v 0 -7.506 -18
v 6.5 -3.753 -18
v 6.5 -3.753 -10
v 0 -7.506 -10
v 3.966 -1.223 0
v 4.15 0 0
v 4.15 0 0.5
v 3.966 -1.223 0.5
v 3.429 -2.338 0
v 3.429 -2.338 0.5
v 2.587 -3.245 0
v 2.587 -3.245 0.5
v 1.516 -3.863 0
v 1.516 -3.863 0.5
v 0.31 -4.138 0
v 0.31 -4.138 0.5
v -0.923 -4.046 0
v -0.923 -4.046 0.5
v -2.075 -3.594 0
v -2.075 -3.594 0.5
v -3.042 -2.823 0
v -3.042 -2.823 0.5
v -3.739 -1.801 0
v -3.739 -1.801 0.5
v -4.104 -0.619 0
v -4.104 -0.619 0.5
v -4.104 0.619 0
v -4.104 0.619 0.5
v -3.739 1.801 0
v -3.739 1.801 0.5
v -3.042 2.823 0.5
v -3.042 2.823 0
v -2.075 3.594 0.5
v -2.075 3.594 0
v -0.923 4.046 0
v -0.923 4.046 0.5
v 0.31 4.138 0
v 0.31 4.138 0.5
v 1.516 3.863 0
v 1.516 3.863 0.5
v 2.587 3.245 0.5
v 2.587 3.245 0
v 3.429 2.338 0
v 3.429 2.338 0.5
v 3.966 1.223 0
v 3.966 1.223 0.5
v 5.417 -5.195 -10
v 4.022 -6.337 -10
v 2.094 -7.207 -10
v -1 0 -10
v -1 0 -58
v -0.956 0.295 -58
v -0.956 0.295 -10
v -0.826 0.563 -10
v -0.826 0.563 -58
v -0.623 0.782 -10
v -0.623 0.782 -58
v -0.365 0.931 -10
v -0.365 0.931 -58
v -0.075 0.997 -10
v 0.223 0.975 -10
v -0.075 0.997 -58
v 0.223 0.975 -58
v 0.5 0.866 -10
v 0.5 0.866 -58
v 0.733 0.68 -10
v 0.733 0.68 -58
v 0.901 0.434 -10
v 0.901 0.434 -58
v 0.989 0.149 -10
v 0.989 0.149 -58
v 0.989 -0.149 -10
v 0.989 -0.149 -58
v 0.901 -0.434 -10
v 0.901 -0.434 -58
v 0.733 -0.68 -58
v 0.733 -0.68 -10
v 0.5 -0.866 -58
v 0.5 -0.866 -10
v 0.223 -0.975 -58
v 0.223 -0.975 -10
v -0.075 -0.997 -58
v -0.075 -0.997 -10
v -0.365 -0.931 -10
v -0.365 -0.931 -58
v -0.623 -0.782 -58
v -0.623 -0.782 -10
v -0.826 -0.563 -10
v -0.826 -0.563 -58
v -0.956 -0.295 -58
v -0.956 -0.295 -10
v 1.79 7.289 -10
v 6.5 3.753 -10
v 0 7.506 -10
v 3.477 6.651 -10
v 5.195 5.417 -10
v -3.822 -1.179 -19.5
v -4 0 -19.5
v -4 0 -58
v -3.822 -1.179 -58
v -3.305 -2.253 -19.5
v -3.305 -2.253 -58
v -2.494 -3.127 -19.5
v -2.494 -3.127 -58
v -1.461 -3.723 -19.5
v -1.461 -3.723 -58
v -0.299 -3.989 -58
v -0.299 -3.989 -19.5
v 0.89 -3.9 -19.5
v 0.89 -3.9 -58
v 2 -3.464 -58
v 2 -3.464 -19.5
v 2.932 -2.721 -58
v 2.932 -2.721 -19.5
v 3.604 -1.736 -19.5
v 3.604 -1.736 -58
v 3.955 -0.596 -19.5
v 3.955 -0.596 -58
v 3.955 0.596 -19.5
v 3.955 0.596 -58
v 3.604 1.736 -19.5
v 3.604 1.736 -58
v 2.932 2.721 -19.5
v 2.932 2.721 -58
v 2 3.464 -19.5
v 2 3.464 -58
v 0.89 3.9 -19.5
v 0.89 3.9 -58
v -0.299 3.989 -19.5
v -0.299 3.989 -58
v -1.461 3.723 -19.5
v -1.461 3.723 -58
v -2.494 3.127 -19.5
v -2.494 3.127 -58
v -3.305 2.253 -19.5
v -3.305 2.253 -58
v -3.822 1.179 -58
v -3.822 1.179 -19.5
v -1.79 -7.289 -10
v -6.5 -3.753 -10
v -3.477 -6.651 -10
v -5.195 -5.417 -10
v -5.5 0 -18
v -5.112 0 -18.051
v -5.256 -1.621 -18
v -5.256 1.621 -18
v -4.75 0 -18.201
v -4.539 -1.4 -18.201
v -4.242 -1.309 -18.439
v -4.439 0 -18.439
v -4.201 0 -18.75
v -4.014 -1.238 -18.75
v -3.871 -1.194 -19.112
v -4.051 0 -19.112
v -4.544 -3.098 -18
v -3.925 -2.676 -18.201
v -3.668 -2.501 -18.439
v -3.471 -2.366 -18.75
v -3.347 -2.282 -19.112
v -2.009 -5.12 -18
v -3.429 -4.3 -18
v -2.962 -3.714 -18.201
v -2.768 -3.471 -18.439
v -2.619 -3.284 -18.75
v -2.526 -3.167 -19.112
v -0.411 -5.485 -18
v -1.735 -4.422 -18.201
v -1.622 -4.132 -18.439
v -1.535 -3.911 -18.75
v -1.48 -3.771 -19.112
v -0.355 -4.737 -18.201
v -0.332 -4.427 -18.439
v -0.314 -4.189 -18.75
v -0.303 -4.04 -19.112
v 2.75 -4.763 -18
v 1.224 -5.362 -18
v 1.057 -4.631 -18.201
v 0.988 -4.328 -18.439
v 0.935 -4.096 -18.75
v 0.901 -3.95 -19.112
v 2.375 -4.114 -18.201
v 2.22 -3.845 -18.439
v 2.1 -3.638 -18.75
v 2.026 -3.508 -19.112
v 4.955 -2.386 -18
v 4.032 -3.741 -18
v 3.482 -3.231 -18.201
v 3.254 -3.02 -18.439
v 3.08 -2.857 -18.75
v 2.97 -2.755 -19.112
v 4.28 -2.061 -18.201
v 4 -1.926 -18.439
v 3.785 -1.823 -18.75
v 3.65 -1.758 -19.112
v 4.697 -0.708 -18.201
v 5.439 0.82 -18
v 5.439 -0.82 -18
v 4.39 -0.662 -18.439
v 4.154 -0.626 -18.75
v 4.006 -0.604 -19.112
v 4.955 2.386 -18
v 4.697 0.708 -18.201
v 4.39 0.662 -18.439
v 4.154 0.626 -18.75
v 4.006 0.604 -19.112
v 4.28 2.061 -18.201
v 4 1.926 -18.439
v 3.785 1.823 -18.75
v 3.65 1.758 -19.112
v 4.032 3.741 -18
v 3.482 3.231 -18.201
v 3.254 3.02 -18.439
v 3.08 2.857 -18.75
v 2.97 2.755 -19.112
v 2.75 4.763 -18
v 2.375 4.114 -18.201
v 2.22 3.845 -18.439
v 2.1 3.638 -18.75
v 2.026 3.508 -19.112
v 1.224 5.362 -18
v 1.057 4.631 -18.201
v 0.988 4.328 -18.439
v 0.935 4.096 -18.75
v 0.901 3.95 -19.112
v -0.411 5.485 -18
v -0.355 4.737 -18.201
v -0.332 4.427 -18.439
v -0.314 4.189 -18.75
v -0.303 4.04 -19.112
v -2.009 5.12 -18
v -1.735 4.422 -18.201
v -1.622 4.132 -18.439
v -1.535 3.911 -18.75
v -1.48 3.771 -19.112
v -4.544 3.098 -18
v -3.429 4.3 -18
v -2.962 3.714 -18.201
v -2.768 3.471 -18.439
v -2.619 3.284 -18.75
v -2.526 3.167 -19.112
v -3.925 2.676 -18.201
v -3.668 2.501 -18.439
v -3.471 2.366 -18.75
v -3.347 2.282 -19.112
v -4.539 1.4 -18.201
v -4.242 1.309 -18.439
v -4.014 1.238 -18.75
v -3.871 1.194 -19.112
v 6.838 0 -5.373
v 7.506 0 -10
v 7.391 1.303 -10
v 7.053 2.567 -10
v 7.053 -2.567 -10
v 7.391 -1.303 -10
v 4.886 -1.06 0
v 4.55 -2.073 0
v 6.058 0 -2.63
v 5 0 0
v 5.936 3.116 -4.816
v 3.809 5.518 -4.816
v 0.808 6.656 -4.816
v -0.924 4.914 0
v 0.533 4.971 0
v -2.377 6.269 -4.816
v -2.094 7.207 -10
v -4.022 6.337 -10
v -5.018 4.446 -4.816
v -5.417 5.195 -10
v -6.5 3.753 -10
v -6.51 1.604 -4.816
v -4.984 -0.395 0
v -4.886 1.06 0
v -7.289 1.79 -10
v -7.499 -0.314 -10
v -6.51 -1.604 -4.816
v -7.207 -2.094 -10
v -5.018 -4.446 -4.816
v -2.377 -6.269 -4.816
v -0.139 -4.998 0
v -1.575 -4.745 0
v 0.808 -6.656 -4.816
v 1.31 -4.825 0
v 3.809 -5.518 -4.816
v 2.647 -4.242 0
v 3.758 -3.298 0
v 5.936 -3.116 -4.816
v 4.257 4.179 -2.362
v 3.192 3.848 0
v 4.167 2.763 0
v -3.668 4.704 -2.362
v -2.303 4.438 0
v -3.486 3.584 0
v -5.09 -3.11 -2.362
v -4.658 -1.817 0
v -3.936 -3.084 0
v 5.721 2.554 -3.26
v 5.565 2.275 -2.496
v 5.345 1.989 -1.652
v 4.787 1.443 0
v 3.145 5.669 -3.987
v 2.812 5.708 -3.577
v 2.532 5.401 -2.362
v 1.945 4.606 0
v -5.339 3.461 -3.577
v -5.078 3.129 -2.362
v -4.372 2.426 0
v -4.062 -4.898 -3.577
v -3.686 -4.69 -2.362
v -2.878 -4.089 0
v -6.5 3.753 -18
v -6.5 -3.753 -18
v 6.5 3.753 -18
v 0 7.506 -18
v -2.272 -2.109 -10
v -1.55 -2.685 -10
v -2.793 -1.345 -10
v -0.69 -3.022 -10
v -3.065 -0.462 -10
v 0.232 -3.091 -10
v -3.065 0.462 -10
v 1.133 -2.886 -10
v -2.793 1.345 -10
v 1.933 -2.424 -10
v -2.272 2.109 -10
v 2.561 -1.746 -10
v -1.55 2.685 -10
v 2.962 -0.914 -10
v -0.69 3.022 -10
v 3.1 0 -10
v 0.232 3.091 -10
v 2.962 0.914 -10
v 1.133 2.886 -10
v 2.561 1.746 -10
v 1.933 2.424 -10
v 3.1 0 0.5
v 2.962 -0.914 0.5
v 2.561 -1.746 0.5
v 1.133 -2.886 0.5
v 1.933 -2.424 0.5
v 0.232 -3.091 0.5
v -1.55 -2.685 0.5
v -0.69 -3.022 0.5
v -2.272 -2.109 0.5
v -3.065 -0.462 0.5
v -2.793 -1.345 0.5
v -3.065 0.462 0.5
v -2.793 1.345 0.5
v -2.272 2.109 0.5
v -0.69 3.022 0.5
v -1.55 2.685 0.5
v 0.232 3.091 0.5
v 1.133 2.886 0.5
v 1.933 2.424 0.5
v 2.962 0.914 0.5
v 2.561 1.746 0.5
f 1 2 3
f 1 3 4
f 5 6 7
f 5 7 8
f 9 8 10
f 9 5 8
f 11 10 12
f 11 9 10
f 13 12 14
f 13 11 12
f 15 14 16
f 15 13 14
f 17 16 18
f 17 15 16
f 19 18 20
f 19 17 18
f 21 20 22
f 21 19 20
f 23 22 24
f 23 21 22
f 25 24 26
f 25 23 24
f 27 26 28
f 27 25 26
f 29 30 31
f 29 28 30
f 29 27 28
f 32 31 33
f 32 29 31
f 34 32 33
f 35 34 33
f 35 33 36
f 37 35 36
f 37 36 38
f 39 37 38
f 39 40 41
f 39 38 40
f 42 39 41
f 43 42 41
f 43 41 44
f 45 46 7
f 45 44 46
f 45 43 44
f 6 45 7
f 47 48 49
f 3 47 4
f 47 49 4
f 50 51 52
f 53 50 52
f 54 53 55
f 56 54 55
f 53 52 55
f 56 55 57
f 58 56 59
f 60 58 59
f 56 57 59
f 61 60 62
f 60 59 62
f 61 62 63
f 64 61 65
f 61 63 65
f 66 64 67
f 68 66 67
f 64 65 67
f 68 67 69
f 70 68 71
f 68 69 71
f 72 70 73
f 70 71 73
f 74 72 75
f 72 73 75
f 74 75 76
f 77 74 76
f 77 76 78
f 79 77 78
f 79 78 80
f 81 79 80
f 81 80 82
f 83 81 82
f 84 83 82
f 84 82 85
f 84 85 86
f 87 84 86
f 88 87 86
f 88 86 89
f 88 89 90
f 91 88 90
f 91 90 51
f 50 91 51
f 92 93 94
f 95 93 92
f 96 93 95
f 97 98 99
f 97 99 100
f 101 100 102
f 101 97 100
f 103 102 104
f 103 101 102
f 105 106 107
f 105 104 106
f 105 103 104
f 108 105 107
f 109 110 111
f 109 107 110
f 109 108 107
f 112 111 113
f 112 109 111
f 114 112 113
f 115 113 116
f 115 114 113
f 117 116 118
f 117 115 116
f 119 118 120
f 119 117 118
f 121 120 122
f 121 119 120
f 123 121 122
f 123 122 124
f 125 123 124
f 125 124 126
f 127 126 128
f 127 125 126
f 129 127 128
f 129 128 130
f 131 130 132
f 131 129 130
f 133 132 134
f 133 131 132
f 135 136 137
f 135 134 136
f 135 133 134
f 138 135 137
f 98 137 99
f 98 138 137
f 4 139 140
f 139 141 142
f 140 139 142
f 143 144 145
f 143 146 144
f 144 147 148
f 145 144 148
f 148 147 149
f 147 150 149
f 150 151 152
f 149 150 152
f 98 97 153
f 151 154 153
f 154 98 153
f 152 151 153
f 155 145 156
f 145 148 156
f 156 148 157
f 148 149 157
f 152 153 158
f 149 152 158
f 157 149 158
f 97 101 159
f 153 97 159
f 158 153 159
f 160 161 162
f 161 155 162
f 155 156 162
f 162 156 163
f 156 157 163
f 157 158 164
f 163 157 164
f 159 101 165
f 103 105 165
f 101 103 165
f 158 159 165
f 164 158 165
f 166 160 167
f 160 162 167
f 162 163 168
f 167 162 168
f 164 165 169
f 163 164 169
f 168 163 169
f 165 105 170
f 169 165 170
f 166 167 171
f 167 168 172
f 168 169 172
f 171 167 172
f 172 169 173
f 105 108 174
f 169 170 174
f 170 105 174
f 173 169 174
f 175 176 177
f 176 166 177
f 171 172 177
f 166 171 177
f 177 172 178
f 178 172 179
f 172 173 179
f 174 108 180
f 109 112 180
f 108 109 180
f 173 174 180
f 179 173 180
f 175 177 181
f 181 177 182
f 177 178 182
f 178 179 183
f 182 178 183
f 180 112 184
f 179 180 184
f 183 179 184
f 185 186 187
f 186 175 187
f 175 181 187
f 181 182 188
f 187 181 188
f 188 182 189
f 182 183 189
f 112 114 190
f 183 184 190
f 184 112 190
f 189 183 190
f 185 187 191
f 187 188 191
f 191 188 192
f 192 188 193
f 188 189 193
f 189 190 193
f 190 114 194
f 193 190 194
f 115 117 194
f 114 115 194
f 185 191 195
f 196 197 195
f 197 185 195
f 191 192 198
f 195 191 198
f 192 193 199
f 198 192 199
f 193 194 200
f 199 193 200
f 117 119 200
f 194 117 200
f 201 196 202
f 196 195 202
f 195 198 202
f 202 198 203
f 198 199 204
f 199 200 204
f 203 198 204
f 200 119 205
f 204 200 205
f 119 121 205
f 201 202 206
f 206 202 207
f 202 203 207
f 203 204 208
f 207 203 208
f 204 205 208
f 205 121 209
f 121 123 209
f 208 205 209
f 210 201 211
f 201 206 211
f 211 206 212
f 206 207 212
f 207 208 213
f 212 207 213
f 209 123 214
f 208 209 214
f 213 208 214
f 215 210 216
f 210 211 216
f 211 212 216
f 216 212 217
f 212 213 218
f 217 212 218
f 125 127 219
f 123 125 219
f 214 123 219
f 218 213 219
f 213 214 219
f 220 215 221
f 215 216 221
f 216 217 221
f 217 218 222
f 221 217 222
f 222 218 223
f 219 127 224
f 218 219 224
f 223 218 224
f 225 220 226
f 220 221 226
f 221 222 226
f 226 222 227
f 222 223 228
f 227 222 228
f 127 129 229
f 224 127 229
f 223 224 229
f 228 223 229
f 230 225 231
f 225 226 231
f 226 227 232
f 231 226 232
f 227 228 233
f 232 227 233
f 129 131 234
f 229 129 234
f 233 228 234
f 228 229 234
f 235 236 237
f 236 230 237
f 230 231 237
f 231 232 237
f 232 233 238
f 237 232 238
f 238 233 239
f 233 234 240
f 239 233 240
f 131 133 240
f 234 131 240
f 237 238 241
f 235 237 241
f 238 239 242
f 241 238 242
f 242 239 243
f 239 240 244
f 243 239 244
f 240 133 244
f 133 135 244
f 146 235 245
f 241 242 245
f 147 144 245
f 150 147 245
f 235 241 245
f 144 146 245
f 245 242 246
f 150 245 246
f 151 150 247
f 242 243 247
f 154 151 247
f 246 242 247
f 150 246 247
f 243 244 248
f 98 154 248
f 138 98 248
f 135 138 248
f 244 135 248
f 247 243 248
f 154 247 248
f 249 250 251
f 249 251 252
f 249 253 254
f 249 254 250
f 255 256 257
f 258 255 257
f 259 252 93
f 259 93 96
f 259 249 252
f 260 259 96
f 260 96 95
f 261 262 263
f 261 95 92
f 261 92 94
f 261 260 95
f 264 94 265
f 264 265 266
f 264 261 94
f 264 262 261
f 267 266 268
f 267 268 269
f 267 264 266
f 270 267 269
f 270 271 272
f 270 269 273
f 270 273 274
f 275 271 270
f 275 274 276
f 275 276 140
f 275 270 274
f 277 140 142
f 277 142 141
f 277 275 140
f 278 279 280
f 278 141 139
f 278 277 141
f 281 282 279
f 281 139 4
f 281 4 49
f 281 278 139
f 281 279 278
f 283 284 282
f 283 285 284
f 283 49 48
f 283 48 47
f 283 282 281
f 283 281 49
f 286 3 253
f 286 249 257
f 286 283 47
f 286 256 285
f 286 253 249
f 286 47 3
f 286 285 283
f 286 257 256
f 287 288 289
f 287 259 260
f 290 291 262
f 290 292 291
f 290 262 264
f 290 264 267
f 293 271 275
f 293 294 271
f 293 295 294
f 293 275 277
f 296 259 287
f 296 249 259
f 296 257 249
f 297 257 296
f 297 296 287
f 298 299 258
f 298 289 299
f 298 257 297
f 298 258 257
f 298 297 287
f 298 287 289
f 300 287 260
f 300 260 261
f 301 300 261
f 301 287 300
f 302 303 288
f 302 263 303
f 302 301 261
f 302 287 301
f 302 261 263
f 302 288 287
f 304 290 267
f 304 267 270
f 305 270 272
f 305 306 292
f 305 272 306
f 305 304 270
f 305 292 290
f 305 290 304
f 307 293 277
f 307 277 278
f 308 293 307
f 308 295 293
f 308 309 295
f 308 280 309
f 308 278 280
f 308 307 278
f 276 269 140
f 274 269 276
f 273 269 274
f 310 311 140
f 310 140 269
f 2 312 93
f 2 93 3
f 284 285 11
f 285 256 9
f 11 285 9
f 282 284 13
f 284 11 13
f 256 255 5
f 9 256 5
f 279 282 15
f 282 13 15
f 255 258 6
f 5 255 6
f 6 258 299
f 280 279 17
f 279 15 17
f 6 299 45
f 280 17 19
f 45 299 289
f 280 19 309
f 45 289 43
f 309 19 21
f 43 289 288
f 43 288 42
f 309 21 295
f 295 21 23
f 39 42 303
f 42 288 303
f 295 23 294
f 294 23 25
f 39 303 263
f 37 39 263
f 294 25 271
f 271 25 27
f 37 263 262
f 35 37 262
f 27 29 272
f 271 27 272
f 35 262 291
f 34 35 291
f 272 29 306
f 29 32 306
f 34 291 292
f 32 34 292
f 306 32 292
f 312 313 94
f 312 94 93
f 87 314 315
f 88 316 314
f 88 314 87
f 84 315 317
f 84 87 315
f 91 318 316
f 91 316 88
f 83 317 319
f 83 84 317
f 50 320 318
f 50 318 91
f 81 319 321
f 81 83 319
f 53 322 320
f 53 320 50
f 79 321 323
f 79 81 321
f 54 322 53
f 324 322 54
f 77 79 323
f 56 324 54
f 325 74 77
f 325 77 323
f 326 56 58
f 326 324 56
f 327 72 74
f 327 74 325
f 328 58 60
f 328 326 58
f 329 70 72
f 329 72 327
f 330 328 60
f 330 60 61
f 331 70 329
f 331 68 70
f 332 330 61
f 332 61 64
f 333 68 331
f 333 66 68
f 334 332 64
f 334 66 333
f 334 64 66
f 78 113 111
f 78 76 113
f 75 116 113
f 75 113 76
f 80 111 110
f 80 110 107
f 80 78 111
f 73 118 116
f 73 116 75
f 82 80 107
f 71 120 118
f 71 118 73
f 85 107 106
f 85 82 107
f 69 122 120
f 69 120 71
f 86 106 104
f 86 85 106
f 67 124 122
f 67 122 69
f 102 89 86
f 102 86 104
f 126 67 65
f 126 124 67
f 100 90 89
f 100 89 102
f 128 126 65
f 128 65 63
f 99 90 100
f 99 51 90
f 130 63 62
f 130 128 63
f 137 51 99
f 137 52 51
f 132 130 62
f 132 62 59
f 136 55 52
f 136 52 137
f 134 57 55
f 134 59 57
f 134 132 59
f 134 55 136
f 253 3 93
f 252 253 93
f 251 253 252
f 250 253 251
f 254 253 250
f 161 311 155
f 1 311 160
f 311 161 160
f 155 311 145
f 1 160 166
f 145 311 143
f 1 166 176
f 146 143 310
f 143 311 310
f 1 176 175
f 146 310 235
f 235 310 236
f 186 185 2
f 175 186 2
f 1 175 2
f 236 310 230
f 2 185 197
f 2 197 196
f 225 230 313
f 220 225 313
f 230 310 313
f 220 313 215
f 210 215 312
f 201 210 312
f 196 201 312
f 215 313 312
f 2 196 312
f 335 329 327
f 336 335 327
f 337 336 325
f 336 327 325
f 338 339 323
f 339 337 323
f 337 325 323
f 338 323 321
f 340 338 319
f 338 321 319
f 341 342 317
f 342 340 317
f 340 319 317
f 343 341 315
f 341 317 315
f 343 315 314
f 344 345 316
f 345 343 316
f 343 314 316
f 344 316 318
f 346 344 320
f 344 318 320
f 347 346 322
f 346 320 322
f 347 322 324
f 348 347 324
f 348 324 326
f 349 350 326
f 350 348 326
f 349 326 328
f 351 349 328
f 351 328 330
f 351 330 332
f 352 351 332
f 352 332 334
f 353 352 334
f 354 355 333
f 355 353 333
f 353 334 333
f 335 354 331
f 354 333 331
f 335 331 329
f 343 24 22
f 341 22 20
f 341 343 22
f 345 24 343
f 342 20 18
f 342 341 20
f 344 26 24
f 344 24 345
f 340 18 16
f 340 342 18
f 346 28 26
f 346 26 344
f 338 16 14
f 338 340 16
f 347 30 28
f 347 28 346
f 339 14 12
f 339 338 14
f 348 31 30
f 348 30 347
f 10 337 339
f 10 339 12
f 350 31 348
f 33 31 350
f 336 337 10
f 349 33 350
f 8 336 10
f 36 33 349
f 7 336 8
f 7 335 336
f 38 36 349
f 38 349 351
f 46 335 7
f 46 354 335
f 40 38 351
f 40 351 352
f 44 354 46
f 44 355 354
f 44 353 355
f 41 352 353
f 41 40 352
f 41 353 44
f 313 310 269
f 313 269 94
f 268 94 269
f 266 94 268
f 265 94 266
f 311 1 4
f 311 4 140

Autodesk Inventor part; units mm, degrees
ref_plane "YZ Plane" through (0, 0, 0) normal (1, 0, 0) x (0, 1, 0)
ref_plane "XZ Plane" through (0, 0, 0) normal (0, 1, 0) x (-1, 0, 0)
sketch "Sketch2" plane through (0, 0, 0) normal (0, 0, 1) x (1, 0, 0)
  circle A0 centre (0, 0) radius 5
  dimension "d1" = 10
sketch "Sketch3" plane through (0, 0, 0) normal (0, 0, 1) x (1, 0, 0)
  circle A0 centre (0, 0) radius 3.1
  dimension "d2" = 6.2
sketch "Sketch4" plane through (0, 0, 0) normal (0, 0, 1) x (1, 0, 0)
  circle A0 centre (0, 0) radius 4.15
  dimension "d3" = 8.3
ref_plane "Work Plane5" through (0, 0, -10) normal (0, 0, 1) x (1, 0, 0)
sketch "Sketch5" plane through (0, 0, -10) normal (0, 0, 1) x (1, 0, 0)
  circle A0 centre (0, 0) radius 7.5055
  dimension "d9" = 15.011
ref_plane "Work Plane3" through (0, 0, -5) normal (0, 0, 1) x (1, 0, 0)
sketch "Sketch6" plane through (0, 0, -5) normal (0, 0, 1) x (1, 0, 0)
  circle A0 centre (0, 0) radius 6.75
  dimension "d11" = 13.5
loft "Loft1" add profiles "Sketch5", "Sketch6", "Sketch2"
extrude "Extrusion2" add sketch "Sketch4" along normal blind 0.5
extrude "Extrusion3" cut sketch "Sketch3" along normal blind 0.5 and the other way blind 10
ref_plane "Work Plane4" through (0, 0, -18) normal (0, 0, 1) x (1, 0, 0)
sketch "Sketch8" plane through (0, 0, -18) normal (0, 0, 1) x (1, 0, 0)
  line L0 (0, 7.5056) -> (6.5, 3.7528)
  line L1 (6.5, 3.7528) -> (6.5, -3.7528)
  line L2 (6.5, -3.7528) -> (0, -7.5056)
  line L3 (0, -7.5056) -> (-6.5, -3.7528)
  line L4 (-6.5, -3.7528) -> (-6.5, 3.7528)
  line L5 (-6.5, 3.7528) -> (0, 7.5056)
  point P0 (0, 0)
  point P1 (0, 0)
  dimension "d27" = 13
extrude "Extrusion4" add sketch "Sketch8" along normal blind 8
sketch "Sketch9" plane through (0, 0, -18) normal (0, 0, -1) x (-1, 0, 0)
  circle A0 centre (0, 0) radius 4
  dimension "d30" = 8
extrude "Extrusion5" add sketch "Sketch9" along normal blind 40
sketch "Sketch10" plane through (0, 0, -58) normal (0, 0, -1) x (-1, 0, 0)
  circle A0 centre (0, 0) radius 4 projected
  circle A1 centre (0, 0) radius 1
  dimension "d33" = 2
extrude "Extrusion6" cut sketch "Sketch10" against normal blind 40 contours A1
sketch "Sketch11" plane through (0, 0, -18) normal (0, 0, -1) x (-1, 0, 0)
  circle A0 centre (0, 0) radius 4 projected
  circle A1 centre (0, 0) radius 1
  dimension "d36" = 2
extrude "Extrusion7" cut sketch "Sketch11" against normal blind 8 contours A1
thread "Thread1" size "M8x1.25" class "6g" standard "ISO Metric profile" length 38
fillet "Fillet1" radius 1.5 1 edges at (4, 0, -18)
properties part number "Adjustment screw"
